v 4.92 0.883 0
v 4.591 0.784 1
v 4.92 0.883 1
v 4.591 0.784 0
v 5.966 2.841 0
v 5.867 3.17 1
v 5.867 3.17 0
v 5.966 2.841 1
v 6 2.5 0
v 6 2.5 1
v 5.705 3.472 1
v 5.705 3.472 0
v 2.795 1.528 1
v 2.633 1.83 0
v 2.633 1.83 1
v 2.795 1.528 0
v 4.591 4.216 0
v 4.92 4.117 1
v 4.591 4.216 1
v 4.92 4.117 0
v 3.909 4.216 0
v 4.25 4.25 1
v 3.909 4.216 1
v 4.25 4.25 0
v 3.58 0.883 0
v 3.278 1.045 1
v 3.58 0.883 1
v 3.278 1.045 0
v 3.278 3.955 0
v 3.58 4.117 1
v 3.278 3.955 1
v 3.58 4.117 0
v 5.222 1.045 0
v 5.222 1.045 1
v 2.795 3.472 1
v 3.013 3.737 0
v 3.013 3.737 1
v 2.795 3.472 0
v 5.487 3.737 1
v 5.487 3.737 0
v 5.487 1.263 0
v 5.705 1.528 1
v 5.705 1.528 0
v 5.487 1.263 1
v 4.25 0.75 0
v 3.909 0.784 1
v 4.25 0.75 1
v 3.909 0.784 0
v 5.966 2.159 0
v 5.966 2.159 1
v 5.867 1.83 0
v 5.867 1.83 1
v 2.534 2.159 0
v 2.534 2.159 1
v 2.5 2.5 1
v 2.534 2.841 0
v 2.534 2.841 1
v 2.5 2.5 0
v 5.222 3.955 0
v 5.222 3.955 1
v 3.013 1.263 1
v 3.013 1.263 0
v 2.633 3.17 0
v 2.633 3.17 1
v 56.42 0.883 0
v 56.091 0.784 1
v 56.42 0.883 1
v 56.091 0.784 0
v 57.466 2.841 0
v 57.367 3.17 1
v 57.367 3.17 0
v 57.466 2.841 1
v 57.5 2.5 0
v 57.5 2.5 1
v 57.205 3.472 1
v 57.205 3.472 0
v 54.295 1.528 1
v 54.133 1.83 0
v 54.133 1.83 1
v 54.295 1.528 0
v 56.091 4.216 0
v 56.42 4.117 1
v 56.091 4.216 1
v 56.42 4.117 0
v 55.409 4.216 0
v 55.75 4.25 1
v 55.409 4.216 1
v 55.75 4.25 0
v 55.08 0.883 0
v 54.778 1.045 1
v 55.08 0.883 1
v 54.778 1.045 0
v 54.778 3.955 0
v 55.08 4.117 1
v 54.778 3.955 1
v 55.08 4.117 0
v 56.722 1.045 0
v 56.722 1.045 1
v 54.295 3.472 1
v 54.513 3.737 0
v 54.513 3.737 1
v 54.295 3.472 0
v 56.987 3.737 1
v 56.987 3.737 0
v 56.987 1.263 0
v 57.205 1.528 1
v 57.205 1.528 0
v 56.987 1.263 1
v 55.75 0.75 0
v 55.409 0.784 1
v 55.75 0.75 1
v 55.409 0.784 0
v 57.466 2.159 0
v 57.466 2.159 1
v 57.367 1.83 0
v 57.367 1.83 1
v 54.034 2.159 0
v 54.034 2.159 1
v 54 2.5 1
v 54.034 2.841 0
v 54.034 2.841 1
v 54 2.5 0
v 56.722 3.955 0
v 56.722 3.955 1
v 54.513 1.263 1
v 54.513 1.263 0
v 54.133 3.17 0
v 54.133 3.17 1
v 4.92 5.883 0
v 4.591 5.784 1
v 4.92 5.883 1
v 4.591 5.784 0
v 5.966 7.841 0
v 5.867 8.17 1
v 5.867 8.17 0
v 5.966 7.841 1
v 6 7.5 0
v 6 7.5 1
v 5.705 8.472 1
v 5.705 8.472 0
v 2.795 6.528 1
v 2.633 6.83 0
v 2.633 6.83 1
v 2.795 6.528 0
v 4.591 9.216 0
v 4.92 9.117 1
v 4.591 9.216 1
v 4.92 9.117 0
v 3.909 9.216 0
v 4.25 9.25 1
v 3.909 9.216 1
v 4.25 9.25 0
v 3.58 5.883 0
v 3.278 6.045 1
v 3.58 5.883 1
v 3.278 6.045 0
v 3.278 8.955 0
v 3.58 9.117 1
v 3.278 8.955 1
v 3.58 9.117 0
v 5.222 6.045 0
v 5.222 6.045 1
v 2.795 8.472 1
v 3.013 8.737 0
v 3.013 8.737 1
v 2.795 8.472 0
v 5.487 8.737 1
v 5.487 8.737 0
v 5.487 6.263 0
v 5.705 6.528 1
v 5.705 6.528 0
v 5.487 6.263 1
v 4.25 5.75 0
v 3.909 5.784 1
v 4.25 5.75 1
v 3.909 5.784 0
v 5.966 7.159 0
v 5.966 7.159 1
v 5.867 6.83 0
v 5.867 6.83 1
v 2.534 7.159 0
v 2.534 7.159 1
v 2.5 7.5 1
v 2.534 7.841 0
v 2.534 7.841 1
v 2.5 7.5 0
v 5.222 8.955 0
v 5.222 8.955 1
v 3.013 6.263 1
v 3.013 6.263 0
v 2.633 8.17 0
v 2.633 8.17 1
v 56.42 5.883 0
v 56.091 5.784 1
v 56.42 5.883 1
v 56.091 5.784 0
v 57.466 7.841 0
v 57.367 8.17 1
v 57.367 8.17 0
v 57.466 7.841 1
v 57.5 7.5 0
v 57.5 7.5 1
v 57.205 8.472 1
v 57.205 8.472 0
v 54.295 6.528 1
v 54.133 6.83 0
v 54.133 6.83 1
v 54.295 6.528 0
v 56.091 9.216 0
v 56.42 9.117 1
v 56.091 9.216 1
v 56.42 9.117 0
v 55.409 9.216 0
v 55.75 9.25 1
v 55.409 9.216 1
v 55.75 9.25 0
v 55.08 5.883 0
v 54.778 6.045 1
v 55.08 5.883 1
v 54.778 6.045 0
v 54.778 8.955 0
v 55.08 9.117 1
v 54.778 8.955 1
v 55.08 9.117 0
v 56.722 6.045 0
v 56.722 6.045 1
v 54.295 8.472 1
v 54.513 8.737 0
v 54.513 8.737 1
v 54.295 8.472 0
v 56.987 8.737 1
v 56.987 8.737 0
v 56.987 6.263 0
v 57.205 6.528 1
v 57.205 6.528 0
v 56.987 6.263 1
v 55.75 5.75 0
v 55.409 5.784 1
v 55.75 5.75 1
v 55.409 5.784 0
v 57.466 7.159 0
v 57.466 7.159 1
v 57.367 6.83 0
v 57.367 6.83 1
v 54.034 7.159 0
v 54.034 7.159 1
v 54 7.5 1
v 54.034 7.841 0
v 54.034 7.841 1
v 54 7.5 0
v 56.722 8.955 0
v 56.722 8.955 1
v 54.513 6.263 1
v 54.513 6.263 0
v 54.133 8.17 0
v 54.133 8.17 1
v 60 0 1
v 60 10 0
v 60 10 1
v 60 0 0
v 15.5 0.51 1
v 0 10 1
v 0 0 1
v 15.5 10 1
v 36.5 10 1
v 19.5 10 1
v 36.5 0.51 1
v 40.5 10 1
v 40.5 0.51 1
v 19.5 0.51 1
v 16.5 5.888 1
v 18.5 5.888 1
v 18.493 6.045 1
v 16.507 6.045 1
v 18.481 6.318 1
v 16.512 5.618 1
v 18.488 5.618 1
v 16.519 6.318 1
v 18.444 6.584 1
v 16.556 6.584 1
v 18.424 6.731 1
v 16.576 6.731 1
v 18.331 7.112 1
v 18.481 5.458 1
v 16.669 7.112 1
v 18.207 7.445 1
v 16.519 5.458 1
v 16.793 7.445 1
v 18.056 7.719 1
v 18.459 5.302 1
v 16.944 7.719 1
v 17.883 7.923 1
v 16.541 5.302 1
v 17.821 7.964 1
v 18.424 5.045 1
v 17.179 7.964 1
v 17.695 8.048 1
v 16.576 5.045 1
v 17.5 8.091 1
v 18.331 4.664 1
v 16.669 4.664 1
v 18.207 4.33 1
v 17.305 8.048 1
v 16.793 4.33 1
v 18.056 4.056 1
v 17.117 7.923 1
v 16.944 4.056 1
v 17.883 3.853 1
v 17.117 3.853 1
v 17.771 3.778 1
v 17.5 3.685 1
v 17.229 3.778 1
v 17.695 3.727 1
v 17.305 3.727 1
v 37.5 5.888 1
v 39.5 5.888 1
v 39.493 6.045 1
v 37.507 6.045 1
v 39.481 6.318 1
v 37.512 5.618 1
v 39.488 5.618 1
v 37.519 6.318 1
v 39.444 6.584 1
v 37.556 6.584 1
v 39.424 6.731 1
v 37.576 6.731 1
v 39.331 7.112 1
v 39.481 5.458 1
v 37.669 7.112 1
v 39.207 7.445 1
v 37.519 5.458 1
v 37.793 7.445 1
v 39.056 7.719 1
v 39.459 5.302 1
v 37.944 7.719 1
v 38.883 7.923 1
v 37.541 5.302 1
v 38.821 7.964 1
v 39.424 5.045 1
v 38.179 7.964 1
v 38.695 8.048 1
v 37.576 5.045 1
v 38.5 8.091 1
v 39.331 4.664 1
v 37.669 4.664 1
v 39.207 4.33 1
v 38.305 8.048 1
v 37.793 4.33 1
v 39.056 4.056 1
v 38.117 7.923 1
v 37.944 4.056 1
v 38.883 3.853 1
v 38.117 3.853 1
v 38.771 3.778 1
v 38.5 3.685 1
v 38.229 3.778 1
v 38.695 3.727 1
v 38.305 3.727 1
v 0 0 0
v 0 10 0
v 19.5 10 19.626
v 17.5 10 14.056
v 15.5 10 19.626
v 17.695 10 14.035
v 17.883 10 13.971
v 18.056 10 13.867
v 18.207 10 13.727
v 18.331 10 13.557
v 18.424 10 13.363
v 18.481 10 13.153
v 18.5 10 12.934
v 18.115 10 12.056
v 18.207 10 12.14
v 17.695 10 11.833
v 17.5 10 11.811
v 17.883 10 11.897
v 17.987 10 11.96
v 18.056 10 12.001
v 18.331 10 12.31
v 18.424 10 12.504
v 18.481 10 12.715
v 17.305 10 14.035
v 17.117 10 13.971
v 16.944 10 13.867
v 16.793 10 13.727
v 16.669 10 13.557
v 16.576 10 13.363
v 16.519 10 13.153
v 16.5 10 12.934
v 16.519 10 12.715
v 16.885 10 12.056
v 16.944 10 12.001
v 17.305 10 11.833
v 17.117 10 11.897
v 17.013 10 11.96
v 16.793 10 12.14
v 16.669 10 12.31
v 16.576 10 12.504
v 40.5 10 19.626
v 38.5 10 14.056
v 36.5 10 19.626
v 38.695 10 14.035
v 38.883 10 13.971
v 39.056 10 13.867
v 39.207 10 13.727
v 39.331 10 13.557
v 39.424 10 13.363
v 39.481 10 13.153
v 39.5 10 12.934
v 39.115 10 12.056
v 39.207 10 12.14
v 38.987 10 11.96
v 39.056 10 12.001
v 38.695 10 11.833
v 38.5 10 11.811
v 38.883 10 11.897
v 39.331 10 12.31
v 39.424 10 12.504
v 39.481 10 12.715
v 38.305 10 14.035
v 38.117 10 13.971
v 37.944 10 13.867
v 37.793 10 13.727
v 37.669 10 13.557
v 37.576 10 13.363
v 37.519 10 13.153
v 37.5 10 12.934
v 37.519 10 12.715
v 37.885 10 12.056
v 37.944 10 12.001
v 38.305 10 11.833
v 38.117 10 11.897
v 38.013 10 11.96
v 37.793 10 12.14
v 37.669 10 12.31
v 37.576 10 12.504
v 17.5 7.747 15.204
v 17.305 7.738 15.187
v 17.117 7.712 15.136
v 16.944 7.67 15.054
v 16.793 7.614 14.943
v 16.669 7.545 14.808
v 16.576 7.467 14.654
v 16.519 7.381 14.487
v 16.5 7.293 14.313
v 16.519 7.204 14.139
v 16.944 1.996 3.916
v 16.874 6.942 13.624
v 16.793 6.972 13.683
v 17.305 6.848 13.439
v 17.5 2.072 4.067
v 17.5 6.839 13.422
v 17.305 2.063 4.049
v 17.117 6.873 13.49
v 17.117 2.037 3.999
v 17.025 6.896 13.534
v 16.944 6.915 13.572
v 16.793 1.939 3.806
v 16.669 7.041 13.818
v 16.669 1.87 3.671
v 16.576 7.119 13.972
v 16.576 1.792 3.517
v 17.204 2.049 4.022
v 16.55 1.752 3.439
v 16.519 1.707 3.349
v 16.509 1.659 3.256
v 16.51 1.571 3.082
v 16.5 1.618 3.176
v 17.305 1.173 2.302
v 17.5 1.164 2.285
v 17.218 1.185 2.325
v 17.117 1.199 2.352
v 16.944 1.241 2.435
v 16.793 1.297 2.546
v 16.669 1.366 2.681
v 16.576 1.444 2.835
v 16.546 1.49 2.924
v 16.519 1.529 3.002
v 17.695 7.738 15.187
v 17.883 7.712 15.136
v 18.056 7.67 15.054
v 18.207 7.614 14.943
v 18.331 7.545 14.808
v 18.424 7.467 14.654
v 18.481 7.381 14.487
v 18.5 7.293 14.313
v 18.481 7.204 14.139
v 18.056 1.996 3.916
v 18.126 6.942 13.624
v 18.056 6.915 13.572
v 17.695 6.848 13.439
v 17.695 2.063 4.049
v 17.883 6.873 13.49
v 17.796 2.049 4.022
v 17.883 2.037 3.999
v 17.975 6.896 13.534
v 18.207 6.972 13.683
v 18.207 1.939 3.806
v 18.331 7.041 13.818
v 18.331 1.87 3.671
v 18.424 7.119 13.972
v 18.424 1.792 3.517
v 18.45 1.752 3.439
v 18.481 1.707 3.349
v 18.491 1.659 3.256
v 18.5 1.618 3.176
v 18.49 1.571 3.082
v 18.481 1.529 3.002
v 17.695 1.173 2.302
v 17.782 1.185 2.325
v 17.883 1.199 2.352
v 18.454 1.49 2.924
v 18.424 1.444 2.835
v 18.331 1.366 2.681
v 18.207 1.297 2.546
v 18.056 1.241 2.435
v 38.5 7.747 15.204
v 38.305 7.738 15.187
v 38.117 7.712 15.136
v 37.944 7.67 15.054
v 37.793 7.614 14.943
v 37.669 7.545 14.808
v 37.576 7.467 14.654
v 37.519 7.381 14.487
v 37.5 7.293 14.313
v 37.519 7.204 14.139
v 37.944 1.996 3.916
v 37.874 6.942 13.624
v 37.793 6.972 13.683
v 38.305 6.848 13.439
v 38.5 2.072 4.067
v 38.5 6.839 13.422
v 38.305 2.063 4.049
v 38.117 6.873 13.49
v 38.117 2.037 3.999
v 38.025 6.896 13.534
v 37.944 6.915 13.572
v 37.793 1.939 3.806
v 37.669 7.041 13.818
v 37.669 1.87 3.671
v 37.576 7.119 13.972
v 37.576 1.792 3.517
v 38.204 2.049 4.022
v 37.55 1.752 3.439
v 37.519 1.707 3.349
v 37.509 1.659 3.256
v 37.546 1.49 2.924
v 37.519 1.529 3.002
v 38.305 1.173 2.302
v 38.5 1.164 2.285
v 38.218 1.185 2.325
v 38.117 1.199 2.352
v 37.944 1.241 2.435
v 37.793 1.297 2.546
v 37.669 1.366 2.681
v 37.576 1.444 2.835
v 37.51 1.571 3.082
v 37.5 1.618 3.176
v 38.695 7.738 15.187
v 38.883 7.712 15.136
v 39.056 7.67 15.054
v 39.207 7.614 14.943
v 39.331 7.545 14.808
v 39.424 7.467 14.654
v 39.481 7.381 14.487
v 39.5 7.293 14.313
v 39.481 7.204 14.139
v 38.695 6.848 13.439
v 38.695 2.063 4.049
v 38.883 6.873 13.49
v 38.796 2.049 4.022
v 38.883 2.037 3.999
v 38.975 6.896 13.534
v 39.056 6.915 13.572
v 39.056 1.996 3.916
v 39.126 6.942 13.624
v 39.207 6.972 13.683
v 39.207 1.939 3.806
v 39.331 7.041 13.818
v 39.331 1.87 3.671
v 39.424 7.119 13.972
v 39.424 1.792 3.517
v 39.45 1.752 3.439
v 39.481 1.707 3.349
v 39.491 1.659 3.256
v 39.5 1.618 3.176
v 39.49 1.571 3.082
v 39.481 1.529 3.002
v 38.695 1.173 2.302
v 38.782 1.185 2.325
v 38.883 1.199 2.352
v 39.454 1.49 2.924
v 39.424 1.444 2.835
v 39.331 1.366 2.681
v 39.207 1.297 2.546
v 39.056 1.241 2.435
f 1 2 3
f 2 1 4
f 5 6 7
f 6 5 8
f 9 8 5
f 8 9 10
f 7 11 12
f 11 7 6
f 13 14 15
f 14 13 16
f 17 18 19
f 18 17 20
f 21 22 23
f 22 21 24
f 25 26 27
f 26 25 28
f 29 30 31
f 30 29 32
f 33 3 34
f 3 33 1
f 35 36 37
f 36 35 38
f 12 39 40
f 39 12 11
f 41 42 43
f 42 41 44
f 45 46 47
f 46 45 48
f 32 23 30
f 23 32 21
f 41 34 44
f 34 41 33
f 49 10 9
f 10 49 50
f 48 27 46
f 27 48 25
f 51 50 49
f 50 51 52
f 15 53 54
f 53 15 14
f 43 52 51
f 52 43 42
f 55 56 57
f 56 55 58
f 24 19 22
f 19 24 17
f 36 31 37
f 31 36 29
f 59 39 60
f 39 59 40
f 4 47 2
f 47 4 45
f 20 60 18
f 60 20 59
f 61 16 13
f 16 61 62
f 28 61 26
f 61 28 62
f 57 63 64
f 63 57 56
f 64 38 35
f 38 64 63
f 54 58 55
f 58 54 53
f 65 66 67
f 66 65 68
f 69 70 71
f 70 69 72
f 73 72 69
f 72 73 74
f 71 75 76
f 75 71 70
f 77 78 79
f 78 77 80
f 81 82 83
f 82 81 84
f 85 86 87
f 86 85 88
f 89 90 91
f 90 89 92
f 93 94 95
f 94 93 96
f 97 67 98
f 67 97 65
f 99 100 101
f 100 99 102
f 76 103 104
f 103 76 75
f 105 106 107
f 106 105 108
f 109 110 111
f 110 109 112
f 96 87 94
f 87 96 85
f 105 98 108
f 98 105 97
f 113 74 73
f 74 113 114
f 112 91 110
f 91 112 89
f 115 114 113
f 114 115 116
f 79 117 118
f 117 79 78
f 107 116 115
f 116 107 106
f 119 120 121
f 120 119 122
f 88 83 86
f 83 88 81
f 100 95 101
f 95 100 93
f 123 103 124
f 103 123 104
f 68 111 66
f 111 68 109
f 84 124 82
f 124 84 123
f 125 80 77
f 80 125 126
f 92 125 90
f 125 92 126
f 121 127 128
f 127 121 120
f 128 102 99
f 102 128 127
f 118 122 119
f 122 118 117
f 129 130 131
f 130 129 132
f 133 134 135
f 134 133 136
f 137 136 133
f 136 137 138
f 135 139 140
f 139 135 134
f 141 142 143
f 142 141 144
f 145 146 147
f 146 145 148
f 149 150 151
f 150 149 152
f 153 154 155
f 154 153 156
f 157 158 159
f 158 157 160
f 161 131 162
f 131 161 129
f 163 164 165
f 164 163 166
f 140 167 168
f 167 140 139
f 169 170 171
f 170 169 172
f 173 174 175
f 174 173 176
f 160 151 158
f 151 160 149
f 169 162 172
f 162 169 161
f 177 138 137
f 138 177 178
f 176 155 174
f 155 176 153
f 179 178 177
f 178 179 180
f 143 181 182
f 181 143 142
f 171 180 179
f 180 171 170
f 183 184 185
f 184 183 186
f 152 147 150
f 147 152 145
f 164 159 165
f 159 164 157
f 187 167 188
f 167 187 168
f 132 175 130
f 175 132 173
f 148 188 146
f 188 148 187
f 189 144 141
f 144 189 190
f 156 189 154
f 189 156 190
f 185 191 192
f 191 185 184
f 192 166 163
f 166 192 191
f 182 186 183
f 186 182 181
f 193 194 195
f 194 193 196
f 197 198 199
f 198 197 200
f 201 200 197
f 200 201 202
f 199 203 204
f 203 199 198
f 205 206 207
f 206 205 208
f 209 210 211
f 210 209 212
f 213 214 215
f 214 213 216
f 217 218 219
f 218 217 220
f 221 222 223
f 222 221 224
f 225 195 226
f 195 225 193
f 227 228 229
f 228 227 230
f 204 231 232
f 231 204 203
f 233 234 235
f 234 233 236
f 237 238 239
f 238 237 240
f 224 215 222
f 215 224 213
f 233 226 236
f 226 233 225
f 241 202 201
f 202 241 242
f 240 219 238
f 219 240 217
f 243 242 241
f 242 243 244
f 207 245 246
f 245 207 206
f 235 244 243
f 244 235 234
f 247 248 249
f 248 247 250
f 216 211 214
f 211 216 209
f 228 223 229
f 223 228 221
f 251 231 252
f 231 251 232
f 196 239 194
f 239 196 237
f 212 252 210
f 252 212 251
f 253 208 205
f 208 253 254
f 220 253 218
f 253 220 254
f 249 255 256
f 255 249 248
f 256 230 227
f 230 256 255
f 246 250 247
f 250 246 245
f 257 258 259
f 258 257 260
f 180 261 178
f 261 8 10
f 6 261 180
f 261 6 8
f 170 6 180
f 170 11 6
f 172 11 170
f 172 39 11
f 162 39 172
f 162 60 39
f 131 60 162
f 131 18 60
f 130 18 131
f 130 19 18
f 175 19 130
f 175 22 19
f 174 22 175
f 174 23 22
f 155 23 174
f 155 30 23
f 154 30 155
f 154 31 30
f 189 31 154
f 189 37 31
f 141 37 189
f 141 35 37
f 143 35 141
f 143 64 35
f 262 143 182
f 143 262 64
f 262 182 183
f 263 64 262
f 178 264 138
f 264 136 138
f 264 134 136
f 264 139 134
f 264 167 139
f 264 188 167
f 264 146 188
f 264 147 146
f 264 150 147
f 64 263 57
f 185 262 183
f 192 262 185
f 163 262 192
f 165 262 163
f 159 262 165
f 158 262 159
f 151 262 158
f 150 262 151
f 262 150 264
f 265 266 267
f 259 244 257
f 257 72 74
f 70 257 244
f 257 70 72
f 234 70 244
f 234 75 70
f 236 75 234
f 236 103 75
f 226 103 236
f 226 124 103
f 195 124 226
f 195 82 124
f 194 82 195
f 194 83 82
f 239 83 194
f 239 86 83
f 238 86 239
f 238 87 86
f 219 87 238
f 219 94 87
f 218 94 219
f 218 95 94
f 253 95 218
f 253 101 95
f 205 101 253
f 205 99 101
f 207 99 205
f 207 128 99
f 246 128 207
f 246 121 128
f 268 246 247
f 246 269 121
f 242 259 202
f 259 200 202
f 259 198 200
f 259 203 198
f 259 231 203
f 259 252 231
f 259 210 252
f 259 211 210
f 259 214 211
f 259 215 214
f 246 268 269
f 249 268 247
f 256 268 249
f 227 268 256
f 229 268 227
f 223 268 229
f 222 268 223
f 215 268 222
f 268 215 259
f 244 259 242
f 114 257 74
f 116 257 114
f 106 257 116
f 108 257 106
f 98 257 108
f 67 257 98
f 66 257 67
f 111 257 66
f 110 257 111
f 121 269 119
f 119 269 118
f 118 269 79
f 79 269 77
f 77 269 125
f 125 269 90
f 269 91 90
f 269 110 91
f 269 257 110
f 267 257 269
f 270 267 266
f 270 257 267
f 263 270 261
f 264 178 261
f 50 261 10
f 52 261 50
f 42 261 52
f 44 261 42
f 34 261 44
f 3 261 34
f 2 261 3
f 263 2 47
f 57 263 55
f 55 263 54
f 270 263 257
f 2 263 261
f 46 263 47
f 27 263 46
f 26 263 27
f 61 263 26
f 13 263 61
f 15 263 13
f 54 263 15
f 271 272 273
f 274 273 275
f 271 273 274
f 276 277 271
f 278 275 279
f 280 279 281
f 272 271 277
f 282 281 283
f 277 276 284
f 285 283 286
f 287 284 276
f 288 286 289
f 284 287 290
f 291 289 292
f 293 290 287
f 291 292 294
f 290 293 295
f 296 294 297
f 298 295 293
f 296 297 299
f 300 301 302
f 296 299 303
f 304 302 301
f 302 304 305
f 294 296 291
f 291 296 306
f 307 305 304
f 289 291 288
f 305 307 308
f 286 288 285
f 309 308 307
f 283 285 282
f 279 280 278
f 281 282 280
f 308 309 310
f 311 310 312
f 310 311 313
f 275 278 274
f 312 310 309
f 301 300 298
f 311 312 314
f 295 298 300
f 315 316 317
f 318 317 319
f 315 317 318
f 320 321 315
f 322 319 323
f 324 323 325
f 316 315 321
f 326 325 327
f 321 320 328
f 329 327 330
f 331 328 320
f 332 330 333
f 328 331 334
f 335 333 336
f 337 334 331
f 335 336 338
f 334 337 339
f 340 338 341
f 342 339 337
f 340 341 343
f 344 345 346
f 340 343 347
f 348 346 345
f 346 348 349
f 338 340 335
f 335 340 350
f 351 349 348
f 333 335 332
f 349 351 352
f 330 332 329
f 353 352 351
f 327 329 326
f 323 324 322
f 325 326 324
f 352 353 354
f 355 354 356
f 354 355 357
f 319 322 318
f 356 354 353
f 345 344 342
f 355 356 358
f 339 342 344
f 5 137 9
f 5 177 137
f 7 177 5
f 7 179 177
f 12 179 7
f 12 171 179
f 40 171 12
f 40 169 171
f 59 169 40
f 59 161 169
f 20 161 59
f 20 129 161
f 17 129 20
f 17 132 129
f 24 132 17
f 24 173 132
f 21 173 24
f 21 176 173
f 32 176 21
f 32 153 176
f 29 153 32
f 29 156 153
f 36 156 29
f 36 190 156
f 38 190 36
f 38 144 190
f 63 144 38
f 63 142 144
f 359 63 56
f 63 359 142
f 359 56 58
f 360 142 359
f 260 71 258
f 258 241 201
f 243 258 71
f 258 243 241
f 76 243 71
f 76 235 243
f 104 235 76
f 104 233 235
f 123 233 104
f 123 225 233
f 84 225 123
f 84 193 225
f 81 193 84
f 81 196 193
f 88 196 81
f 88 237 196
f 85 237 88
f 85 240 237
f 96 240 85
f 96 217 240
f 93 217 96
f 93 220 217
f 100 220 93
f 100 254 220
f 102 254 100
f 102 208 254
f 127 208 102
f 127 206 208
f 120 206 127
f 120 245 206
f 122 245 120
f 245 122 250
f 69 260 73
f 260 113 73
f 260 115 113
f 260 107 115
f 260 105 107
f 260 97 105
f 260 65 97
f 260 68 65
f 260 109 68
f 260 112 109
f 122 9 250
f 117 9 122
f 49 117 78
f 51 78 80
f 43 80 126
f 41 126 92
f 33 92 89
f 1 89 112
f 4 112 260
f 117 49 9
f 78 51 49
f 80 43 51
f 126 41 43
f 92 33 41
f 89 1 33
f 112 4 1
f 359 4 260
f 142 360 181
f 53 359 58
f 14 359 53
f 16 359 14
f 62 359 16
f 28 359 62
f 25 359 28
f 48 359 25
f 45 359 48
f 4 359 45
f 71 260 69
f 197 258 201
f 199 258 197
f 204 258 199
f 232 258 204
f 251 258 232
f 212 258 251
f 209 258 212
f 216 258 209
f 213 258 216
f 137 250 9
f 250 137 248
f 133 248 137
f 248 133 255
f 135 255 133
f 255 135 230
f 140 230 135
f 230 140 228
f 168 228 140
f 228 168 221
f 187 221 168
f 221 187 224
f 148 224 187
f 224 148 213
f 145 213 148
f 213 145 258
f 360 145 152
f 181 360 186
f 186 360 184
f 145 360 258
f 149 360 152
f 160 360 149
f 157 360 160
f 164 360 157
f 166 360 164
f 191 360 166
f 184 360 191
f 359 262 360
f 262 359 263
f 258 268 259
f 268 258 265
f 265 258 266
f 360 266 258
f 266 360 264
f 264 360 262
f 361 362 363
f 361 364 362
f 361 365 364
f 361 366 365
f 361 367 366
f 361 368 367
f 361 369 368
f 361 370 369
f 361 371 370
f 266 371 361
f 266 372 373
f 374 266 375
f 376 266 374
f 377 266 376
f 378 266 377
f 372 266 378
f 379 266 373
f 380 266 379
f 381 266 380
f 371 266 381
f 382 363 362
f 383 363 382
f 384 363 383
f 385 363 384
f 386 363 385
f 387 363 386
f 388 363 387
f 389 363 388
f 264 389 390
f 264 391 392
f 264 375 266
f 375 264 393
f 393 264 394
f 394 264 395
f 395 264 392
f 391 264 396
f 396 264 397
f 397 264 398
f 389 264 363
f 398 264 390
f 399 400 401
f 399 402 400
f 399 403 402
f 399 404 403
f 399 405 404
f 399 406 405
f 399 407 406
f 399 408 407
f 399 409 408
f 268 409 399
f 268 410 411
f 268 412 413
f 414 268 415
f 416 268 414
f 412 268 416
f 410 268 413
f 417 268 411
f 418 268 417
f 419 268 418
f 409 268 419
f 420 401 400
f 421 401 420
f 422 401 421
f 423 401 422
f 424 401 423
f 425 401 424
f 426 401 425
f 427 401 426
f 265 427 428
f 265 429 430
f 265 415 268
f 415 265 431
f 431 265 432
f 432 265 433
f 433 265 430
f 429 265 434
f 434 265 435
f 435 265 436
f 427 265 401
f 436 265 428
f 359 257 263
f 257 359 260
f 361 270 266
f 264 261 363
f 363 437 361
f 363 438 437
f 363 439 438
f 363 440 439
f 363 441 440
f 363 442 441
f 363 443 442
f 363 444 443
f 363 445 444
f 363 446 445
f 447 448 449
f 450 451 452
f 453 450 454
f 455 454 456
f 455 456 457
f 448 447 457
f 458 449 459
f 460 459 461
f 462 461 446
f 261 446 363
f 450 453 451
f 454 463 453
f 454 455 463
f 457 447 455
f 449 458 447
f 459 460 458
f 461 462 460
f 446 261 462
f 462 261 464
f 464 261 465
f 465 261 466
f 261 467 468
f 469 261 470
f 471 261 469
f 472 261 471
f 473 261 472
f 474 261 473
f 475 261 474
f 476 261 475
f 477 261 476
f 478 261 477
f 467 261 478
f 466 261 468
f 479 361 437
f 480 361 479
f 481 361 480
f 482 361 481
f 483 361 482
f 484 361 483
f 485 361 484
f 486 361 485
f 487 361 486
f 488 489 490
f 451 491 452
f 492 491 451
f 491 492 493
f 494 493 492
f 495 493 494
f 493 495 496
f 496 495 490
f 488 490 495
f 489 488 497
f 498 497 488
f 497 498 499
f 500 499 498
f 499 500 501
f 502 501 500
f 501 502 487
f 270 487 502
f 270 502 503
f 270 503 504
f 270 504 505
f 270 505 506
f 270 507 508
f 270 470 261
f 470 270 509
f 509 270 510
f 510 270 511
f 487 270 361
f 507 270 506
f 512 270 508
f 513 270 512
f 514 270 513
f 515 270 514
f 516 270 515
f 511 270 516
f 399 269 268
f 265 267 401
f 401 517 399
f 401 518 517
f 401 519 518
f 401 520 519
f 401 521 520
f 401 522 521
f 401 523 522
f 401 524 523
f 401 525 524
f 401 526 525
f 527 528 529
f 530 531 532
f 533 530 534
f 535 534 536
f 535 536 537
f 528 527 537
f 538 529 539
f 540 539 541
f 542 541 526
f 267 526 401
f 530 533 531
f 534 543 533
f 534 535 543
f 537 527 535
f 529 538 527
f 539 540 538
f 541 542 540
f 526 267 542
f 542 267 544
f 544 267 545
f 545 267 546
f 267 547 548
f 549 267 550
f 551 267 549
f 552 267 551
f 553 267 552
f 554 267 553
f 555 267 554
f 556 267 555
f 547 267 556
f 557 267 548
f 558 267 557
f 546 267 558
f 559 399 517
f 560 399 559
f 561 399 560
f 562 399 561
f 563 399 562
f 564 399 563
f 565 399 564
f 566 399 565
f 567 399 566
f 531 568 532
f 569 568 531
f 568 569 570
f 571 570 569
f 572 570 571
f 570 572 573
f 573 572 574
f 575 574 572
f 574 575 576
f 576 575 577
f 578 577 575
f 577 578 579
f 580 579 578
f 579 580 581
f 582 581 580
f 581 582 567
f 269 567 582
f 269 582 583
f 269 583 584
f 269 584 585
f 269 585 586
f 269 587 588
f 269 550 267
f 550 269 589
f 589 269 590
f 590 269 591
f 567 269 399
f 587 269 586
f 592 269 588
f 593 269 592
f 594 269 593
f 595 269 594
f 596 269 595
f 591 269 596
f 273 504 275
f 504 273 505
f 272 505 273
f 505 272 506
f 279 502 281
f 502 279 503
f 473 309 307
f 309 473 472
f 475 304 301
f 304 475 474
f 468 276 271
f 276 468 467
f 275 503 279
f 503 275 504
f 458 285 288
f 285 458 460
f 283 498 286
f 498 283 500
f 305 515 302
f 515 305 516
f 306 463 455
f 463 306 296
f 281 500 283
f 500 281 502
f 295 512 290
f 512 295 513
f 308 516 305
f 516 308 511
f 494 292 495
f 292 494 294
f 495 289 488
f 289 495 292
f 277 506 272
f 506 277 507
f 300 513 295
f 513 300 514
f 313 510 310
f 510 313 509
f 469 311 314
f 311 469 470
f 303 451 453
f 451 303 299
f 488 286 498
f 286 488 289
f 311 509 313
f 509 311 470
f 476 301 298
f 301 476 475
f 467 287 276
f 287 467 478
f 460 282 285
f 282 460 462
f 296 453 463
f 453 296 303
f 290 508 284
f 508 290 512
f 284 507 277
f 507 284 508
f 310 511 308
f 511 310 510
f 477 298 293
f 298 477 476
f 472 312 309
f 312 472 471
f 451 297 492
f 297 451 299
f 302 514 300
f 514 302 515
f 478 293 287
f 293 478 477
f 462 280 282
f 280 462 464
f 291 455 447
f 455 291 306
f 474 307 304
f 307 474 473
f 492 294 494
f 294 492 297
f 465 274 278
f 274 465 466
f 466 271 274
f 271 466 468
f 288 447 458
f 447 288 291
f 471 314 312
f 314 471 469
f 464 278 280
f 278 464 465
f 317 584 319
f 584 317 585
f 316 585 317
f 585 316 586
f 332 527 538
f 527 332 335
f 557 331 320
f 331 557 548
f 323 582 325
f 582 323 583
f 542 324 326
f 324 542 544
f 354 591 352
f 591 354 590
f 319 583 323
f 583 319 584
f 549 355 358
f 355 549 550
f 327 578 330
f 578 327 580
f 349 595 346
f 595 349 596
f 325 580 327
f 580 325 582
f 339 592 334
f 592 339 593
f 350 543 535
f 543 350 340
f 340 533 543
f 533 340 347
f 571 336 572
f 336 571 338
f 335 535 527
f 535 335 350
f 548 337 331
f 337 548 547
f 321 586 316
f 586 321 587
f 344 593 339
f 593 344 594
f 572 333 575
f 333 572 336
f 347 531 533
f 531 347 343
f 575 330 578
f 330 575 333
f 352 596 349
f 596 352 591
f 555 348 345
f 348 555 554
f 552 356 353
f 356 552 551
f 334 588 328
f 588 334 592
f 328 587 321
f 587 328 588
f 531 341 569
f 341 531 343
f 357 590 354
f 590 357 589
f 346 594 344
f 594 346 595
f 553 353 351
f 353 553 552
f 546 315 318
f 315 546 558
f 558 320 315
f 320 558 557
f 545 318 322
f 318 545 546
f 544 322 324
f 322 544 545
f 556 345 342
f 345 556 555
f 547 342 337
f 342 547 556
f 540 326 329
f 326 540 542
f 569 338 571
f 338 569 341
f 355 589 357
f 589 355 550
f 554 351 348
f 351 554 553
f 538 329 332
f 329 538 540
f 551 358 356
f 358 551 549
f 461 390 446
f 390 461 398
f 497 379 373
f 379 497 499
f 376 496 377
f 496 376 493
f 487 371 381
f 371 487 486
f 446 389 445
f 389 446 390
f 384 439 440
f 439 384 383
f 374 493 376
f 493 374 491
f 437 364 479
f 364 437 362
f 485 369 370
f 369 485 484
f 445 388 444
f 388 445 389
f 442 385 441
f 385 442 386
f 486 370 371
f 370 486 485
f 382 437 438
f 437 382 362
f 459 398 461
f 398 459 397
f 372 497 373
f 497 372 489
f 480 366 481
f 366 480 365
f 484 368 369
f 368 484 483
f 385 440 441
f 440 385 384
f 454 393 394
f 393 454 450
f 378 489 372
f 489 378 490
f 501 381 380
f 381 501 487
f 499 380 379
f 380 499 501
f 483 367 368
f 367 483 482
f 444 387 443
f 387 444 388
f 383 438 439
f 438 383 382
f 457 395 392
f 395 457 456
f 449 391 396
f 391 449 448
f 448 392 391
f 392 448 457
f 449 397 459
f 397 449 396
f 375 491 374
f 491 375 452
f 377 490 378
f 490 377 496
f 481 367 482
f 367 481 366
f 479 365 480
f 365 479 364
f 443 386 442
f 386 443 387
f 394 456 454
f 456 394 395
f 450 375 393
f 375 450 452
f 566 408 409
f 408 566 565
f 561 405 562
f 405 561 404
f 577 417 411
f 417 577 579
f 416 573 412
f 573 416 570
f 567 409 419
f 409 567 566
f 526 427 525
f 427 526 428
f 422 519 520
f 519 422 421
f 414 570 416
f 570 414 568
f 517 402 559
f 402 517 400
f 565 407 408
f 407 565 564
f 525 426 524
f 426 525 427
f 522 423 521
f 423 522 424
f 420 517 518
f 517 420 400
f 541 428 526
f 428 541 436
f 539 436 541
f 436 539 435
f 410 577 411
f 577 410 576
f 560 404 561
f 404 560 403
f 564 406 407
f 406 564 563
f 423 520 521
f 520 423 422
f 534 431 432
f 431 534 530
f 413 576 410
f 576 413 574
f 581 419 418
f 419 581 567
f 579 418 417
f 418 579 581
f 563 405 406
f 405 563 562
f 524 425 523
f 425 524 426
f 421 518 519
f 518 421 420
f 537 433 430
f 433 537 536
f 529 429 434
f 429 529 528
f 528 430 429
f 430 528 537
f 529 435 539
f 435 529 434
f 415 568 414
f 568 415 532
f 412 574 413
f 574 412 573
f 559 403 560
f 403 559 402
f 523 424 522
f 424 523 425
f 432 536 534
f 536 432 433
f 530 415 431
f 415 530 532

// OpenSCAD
// file: library/Utils.scad
module copy_mirror(x=0,y=0,z=0) 
{ 
    children(); 
    mirror([x, y, z]) children(); 
} 

module copy_move(x=0,y=0,z=0,rx=0,ry=0,rz=0) { 
    children(); 
    move(x, y, z, rx, ry, rz) children(); 
} 

module move(x=0, y=0, z=0, rx=0, ry=0, rz=0) { 
	translate([x,y,z])rotate([rx,ry,rz]) children(); 
}
// main file
use <library/Utils.scad>

width = 60;
height = 10;

backing();
move (x= (width-25)/2) mount();

mountWidth=4;

module backing(thickness=1){
	difference() {
		cube([width, height, thickness]);
		for(a=[2.5: 5: height]){
			holeWidth = 3.5; 
			move(x=6-holeWidth/2, y=a, z=-1)
				cylinder(h=mountWidth + 2, d=holeWidth, $fn=32);
			
			move(x=width - 6 + holeWidth/2, y=a, z=-1)
				cylinder(h=mountWidth + 2, d=holeWidth, $fn=32);
		}
	}

}

module mount(peg=1, x=42, y =25, h = 50){
	mountDepthTop = 29;
	angle=63;

	difference () {
		copy_move(x= x/2) move(x=-mountWidth/2) difference (){
			cube([mountWidth, height, mountDepthTop]);
			move(x=-1, rx=angle)cube([6,40,40]);
		}

		ztranslation=4;
		move(z=ztranslation, rx=angle) translate([0, 0, -50]/2) cylinder(r=peg, h=h, $fn=32);
		move(z=ztranslation, rx=angle) translate([ x, 0, -50]/2) cylinder(r=peg, h=h, $fn=32);
		move(z=ztranslation, rx=angle) translate([0,  y, -50]/2) cylinder(r=peg, h=h, $fn=32);
		move(z=ztranslation, rx=angle) translate([ x,  y ,-50]/2) cylinder(r=peg, h=h, $fn=32);

	}
}
